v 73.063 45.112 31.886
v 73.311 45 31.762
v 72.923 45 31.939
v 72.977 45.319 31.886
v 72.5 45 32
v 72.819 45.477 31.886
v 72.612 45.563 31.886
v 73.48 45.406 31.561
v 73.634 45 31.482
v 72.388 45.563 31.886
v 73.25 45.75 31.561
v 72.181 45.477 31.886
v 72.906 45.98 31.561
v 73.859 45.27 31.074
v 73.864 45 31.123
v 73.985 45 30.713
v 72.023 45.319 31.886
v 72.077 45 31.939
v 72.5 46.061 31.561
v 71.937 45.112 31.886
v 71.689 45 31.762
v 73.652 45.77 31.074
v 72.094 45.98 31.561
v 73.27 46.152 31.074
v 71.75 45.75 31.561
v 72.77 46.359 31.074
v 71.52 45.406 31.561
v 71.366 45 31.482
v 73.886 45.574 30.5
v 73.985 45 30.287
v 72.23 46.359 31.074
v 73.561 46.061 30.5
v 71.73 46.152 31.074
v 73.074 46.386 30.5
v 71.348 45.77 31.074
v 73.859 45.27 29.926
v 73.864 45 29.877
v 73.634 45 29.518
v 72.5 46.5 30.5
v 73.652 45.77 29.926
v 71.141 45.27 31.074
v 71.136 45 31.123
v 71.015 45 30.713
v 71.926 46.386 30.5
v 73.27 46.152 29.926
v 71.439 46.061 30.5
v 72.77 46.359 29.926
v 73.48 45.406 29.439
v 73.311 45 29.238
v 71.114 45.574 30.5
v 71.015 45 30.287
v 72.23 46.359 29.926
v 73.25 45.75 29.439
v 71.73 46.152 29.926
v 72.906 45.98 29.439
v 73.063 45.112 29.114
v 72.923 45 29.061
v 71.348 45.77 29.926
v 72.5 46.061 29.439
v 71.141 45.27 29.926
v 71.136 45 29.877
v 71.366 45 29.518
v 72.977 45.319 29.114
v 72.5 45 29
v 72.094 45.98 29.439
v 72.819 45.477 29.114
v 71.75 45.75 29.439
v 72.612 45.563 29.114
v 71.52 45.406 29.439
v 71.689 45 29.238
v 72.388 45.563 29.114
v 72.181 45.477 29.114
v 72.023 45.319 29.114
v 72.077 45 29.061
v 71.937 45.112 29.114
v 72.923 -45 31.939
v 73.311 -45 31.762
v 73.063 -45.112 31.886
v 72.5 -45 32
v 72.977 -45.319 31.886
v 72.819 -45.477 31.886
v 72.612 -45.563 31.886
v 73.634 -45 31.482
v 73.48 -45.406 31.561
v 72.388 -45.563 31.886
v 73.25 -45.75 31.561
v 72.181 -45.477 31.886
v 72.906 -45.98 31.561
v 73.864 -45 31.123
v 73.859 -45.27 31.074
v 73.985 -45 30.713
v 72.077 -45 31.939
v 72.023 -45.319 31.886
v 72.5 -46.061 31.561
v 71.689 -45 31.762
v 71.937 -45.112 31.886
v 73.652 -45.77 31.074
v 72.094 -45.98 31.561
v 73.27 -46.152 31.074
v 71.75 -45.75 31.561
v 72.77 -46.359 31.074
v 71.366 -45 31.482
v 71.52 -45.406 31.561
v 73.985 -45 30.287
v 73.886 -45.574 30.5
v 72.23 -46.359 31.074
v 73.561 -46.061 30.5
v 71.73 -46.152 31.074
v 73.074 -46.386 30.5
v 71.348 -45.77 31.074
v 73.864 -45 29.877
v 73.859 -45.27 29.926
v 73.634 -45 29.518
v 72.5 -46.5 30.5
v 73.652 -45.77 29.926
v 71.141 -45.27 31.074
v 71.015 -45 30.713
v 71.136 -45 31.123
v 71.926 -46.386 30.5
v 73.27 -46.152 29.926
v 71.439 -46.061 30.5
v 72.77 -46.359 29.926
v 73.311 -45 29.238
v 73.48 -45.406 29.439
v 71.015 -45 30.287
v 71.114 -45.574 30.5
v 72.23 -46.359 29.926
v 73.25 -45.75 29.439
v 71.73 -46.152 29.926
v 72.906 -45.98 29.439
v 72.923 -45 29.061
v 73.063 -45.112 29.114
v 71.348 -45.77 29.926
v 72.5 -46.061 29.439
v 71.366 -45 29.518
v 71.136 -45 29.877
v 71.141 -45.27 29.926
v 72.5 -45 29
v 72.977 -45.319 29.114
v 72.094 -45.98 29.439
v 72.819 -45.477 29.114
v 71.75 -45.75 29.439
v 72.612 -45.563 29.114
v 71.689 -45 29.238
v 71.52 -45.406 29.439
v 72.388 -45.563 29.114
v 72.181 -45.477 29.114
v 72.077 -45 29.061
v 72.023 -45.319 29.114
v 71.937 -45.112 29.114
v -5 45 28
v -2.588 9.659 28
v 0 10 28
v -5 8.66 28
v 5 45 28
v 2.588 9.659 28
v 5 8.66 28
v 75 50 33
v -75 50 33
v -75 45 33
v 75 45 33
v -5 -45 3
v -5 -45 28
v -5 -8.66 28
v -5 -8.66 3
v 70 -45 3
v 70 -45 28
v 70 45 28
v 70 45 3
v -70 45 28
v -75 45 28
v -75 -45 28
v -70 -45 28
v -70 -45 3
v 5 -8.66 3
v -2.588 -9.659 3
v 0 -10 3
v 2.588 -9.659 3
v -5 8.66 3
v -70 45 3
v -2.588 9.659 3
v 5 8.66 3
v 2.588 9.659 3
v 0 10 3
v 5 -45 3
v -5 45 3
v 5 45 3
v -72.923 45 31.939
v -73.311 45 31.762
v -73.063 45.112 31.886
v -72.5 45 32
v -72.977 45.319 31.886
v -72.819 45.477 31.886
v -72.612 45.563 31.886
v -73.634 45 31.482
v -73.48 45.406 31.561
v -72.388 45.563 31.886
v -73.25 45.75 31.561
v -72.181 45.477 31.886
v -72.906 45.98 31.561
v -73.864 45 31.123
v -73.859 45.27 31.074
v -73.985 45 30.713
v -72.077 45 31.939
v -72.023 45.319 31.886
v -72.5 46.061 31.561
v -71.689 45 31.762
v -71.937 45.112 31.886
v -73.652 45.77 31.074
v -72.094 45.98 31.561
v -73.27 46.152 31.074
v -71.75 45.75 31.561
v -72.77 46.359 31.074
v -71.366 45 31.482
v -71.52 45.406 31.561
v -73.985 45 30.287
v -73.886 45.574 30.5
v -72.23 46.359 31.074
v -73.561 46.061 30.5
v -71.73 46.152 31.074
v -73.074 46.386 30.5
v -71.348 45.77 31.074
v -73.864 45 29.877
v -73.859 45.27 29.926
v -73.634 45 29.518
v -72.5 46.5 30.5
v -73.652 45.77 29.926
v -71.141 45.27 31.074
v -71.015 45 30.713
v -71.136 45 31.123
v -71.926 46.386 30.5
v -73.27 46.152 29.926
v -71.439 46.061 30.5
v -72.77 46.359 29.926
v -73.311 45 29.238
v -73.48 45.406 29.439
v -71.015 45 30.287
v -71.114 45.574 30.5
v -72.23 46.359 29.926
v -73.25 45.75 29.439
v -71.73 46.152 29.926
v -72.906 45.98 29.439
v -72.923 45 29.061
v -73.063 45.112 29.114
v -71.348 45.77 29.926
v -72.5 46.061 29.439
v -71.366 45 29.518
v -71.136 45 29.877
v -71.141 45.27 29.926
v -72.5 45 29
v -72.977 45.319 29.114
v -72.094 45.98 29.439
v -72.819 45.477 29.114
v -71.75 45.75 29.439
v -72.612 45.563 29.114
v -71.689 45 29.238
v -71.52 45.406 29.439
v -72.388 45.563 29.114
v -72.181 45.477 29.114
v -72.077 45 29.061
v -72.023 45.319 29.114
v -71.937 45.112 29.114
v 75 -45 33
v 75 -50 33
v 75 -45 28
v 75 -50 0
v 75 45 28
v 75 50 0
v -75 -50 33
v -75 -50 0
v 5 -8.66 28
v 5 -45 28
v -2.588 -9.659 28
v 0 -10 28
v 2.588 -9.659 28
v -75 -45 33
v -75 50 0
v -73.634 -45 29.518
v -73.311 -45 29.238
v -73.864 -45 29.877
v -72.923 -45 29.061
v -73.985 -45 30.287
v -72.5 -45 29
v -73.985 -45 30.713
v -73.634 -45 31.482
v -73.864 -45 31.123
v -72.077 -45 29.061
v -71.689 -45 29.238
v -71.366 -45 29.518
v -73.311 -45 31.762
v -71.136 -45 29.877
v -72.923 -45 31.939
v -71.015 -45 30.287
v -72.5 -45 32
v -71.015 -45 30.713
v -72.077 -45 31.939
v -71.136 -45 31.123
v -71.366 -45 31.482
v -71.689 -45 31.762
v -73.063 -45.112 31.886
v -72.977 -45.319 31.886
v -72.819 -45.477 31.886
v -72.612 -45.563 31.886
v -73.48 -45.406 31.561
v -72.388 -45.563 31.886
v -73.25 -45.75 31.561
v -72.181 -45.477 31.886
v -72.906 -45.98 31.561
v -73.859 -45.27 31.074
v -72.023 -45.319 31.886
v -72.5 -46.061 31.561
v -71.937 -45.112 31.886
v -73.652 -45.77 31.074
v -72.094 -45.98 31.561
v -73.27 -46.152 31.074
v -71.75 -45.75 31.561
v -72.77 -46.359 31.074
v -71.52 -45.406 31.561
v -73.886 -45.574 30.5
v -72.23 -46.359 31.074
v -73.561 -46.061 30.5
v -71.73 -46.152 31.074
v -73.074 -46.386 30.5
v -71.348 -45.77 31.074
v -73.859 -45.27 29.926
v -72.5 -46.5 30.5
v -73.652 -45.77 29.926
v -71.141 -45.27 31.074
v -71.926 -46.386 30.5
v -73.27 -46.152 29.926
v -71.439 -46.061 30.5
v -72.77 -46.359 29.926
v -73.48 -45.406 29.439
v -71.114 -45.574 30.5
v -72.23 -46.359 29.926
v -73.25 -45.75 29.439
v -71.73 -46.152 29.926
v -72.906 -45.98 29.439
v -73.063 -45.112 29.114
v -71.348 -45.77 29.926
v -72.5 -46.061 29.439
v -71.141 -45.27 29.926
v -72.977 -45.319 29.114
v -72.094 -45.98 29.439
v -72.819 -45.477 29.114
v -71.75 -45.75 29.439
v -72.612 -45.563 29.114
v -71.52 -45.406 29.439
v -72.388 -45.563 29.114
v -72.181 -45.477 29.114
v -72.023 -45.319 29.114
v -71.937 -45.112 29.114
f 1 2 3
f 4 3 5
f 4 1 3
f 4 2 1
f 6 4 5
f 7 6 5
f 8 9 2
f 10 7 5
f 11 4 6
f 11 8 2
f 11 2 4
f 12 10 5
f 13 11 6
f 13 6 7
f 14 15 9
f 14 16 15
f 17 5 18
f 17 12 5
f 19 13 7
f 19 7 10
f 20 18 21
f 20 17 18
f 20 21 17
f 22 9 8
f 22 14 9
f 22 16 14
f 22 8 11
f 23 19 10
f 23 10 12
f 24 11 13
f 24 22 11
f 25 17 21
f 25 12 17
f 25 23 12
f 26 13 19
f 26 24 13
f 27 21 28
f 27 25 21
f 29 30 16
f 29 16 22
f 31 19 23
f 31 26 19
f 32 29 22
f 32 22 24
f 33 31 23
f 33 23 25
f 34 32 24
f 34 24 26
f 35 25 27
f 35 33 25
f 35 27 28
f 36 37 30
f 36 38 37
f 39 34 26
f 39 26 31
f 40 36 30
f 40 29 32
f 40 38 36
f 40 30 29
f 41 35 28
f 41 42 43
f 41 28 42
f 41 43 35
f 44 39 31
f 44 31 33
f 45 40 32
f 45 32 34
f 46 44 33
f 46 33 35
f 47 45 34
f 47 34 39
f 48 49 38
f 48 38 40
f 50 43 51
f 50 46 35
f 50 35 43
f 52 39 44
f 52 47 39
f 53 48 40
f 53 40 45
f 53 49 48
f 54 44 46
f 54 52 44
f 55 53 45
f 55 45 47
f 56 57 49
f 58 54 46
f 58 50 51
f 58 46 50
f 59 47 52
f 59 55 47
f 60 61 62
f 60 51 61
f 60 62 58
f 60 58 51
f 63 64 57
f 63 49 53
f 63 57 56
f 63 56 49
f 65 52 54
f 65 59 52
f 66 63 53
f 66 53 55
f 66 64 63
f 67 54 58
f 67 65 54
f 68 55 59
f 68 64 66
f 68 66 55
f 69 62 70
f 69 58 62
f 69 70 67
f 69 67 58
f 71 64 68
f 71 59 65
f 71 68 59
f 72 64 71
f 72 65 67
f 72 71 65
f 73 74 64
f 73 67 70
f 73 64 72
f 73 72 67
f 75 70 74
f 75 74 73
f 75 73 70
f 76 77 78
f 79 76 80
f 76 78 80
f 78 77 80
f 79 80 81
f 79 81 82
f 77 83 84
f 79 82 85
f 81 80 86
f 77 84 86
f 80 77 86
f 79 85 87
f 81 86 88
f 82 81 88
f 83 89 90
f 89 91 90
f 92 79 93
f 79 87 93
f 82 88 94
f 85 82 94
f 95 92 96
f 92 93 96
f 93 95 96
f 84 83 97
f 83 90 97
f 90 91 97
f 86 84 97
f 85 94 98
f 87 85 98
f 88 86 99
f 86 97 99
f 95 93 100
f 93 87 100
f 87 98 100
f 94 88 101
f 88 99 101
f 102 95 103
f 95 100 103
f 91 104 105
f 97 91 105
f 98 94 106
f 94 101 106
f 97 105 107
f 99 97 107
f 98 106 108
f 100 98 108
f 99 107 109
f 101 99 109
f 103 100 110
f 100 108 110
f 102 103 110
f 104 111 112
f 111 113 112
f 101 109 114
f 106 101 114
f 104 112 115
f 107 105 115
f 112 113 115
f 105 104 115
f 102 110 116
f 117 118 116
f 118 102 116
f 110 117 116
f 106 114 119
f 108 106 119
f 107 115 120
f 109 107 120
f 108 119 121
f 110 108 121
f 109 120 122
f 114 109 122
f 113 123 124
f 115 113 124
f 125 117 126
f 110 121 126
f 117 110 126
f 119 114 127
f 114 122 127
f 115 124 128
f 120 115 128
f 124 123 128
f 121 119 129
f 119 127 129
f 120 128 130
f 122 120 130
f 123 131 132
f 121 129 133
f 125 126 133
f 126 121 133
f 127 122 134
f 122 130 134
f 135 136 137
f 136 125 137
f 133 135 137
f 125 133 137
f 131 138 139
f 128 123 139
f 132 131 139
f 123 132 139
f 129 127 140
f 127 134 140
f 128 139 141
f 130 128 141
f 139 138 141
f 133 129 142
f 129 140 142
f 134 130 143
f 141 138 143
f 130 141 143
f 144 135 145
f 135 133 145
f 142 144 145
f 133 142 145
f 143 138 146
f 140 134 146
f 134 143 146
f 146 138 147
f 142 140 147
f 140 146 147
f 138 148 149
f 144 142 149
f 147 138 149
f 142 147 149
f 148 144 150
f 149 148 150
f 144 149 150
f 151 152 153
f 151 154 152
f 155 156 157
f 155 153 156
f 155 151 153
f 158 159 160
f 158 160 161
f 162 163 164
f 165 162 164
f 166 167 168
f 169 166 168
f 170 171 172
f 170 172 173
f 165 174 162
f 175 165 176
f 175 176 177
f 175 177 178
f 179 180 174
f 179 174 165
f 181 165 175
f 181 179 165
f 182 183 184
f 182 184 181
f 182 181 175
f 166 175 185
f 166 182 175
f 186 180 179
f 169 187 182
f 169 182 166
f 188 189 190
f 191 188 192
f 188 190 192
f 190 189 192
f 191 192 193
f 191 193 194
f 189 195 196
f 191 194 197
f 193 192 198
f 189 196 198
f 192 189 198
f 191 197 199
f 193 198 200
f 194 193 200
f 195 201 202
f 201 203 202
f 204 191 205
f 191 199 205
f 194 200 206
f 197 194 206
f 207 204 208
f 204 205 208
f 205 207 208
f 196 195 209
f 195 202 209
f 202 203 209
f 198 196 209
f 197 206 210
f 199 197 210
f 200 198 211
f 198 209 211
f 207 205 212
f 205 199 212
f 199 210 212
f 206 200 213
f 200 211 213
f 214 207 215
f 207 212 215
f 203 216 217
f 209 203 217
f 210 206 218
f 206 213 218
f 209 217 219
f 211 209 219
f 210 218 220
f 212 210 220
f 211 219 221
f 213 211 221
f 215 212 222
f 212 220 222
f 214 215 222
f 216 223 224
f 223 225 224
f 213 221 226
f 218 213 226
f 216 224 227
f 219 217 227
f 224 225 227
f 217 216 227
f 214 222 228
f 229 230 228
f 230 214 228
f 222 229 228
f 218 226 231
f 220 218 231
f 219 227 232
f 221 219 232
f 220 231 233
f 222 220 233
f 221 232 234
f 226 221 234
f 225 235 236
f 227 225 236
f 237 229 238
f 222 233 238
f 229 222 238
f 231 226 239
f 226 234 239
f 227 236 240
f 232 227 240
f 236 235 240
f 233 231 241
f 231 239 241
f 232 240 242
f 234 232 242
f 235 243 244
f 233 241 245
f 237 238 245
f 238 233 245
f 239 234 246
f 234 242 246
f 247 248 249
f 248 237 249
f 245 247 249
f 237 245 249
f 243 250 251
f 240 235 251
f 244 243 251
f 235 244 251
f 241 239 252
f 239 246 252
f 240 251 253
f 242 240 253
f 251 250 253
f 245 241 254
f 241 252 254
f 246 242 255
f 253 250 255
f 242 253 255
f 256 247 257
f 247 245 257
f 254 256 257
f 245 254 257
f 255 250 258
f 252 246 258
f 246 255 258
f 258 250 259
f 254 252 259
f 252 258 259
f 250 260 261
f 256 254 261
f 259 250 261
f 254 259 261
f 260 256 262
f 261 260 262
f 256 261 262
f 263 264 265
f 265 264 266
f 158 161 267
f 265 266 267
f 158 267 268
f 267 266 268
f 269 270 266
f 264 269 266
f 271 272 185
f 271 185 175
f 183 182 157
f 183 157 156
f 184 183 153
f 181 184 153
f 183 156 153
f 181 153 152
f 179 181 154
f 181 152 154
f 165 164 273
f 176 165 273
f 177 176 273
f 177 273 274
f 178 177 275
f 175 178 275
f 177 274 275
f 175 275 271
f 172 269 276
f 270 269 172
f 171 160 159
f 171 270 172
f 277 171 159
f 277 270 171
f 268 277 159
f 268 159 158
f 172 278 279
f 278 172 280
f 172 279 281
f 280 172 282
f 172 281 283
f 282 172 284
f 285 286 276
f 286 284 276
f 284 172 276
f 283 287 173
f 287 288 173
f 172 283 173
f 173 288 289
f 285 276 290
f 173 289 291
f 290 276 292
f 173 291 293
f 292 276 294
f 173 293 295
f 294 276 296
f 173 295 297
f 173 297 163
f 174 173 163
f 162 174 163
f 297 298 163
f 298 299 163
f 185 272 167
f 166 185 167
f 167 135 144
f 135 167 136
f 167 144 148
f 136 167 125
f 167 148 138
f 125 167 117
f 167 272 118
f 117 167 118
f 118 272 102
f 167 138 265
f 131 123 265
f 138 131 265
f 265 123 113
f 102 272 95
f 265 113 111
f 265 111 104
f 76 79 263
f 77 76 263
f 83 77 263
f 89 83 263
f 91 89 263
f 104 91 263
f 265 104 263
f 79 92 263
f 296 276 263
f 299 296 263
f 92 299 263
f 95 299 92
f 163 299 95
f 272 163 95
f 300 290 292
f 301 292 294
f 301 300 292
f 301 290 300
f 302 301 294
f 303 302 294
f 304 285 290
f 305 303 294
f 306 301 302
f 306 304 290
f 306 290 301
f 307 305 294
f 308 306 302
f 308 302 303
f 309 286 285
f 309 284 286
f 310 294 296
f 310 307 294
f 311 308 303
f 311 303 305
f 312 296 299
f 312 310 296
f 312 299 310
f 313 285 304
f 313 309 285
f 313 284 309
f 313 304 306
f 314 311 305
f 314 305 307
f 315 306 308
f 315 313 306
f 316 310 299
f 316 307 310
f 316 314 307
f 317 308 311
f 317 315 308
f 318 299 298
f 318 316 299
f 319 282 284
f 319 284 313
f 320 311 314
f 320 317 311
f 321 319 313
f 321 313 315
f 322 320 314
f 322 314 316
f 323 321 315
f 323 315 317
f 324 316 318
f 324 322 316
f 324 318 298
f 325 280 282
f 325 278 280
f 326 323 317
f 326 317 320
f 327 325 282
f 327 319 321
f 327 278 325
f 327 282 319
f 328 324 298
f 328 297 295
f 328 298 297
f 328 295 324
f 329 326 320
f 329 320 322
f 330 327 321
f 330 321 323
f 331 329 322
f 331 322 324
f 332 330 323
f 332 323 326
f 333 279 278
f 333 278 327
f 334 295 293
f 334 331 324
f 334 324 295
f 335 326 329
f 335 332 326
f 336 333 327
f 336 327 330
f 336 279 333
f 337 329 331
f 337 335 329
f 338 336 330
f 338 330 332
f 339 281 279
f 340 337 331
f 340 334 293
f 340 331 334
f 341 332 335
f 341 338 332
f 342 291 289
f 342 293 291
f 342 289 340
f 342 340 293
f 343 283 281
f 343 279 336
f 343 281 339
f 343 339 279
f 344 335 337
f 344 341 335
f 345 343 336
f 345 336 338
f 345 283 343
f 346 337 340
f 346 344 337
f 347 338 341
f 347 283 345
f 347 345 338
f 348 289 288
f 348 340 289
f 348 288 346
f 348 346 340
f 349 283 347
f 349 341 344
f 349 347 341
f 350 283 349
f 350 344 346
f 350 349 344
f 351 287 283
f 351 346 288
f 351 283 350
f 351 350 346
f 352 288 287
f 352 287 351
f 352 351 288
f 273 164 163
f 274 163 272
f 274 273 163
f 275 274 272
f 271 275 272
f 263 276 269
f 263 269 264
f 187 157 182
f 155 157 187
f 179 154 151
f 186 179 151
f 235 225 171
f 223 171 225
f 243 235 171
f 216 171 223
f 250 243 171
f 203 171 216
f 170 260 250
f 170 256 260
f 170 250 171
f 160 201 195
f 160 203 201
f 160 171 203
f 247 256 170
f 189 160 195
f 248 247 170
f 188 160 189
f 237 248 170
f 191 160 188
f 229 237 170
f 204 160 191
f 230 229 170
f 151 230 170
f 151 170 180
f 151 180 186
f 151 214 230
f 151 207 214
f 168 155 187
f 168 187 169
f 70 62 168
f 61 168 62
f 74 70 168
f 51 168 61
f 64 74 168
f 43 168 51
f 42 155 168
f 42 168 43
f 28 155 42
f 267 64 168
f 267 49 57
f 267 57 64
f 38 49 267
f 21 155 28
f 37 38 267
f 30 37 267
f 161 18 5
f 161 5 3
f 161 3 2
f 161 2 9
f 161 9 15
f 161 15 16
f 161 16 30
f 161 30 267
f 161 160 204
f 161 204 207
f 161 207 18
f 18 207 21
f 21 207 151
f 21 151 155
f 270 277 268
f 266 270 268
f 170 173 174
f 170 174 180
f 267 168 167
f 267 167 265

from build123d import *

# Parameters (mm, degrees)
F0_W     = 150
F0_H     = 100
F1_DEPTH = 33
F2_W     = 65
F2_H     = 90
F3_DEPTH = 30
F4_W     = 5
F4_H     = 90
F5_DEPTH = 5
F7_R     = 10
F8_DEPTH = 25


with BuildPart() as f1:
    # F0 (on Top) → F1 (new body)
    with BuildSketch(Plane.XY):
        Rectangle(F0_W, F0_H)
    extrude(amount=F1_DEPTH)

    # F2 (on face) → F3 (cut)
    with BuildSketch(Plane.XY.offset(33)):
        with Locations((-37.5, 0)):
            Rectangle(F2_W, F2_H)
        with Locations((37.5, 0)):
            Rectangle(F2_W, F2_H)
    extrude(amount=-F3_DEPTH, mode=Mode.SUBTRACT)

    # F4 (on face) → F5 (cut)
    with BuildSketch(Plane.XY.offset(33)):
        with Locations((-72.5, 0)):
            Rectangle(F4_W, F4_H)
        with Locations((-2.5, 0)):
            Rectangle(F4_W, F4_H)
        with Locations((2.5, 0)):
            Rectangle(F4_W, F4_H)
        with Locations((72.5, 0)):
            Rectangle(F4_W, F4_H)
    extrude(amount=-F5_DEPTH, mode=Mode.SUBTRACT)

    # F7 (on face) → F8 (cut, through all)
    with BuildSketch(Plane.XY.offset(28)):
        Circle(F7_R)
    extrude(amount=-F8_DEPTH, mode=Mode.SUBTRACT)

    # F6 (on face) → F9 (revolve, cut)
    with BuildSketch(Plane.XZ.offset(-45)):
        with BuildLine():
            Line((-72.5, 29), (-72.5, 32))
            ThreePointArc((-72.5, 32), (-74, 30.5), (-72.5, 29))
        make_face()
    revolve(axis=Axis((-72.5, 45, 30.5), (0, 0, -1)), mode=Mode.SUBTRACT)

    # F10: F1 across plane


with BuildPart() as f1_1:
    add(f1.part)
    add(f1.part.mirror(Plane.YZ), mode=Mode.INTERSECT)

    # F11: F1 across plane


with BuildPart() as f1_2:
    add(f1_1.part)
    add(f1_1.part.mirror(Plane.XZ), mode=Mode.INTERSECT)


solid = f1_2.part
